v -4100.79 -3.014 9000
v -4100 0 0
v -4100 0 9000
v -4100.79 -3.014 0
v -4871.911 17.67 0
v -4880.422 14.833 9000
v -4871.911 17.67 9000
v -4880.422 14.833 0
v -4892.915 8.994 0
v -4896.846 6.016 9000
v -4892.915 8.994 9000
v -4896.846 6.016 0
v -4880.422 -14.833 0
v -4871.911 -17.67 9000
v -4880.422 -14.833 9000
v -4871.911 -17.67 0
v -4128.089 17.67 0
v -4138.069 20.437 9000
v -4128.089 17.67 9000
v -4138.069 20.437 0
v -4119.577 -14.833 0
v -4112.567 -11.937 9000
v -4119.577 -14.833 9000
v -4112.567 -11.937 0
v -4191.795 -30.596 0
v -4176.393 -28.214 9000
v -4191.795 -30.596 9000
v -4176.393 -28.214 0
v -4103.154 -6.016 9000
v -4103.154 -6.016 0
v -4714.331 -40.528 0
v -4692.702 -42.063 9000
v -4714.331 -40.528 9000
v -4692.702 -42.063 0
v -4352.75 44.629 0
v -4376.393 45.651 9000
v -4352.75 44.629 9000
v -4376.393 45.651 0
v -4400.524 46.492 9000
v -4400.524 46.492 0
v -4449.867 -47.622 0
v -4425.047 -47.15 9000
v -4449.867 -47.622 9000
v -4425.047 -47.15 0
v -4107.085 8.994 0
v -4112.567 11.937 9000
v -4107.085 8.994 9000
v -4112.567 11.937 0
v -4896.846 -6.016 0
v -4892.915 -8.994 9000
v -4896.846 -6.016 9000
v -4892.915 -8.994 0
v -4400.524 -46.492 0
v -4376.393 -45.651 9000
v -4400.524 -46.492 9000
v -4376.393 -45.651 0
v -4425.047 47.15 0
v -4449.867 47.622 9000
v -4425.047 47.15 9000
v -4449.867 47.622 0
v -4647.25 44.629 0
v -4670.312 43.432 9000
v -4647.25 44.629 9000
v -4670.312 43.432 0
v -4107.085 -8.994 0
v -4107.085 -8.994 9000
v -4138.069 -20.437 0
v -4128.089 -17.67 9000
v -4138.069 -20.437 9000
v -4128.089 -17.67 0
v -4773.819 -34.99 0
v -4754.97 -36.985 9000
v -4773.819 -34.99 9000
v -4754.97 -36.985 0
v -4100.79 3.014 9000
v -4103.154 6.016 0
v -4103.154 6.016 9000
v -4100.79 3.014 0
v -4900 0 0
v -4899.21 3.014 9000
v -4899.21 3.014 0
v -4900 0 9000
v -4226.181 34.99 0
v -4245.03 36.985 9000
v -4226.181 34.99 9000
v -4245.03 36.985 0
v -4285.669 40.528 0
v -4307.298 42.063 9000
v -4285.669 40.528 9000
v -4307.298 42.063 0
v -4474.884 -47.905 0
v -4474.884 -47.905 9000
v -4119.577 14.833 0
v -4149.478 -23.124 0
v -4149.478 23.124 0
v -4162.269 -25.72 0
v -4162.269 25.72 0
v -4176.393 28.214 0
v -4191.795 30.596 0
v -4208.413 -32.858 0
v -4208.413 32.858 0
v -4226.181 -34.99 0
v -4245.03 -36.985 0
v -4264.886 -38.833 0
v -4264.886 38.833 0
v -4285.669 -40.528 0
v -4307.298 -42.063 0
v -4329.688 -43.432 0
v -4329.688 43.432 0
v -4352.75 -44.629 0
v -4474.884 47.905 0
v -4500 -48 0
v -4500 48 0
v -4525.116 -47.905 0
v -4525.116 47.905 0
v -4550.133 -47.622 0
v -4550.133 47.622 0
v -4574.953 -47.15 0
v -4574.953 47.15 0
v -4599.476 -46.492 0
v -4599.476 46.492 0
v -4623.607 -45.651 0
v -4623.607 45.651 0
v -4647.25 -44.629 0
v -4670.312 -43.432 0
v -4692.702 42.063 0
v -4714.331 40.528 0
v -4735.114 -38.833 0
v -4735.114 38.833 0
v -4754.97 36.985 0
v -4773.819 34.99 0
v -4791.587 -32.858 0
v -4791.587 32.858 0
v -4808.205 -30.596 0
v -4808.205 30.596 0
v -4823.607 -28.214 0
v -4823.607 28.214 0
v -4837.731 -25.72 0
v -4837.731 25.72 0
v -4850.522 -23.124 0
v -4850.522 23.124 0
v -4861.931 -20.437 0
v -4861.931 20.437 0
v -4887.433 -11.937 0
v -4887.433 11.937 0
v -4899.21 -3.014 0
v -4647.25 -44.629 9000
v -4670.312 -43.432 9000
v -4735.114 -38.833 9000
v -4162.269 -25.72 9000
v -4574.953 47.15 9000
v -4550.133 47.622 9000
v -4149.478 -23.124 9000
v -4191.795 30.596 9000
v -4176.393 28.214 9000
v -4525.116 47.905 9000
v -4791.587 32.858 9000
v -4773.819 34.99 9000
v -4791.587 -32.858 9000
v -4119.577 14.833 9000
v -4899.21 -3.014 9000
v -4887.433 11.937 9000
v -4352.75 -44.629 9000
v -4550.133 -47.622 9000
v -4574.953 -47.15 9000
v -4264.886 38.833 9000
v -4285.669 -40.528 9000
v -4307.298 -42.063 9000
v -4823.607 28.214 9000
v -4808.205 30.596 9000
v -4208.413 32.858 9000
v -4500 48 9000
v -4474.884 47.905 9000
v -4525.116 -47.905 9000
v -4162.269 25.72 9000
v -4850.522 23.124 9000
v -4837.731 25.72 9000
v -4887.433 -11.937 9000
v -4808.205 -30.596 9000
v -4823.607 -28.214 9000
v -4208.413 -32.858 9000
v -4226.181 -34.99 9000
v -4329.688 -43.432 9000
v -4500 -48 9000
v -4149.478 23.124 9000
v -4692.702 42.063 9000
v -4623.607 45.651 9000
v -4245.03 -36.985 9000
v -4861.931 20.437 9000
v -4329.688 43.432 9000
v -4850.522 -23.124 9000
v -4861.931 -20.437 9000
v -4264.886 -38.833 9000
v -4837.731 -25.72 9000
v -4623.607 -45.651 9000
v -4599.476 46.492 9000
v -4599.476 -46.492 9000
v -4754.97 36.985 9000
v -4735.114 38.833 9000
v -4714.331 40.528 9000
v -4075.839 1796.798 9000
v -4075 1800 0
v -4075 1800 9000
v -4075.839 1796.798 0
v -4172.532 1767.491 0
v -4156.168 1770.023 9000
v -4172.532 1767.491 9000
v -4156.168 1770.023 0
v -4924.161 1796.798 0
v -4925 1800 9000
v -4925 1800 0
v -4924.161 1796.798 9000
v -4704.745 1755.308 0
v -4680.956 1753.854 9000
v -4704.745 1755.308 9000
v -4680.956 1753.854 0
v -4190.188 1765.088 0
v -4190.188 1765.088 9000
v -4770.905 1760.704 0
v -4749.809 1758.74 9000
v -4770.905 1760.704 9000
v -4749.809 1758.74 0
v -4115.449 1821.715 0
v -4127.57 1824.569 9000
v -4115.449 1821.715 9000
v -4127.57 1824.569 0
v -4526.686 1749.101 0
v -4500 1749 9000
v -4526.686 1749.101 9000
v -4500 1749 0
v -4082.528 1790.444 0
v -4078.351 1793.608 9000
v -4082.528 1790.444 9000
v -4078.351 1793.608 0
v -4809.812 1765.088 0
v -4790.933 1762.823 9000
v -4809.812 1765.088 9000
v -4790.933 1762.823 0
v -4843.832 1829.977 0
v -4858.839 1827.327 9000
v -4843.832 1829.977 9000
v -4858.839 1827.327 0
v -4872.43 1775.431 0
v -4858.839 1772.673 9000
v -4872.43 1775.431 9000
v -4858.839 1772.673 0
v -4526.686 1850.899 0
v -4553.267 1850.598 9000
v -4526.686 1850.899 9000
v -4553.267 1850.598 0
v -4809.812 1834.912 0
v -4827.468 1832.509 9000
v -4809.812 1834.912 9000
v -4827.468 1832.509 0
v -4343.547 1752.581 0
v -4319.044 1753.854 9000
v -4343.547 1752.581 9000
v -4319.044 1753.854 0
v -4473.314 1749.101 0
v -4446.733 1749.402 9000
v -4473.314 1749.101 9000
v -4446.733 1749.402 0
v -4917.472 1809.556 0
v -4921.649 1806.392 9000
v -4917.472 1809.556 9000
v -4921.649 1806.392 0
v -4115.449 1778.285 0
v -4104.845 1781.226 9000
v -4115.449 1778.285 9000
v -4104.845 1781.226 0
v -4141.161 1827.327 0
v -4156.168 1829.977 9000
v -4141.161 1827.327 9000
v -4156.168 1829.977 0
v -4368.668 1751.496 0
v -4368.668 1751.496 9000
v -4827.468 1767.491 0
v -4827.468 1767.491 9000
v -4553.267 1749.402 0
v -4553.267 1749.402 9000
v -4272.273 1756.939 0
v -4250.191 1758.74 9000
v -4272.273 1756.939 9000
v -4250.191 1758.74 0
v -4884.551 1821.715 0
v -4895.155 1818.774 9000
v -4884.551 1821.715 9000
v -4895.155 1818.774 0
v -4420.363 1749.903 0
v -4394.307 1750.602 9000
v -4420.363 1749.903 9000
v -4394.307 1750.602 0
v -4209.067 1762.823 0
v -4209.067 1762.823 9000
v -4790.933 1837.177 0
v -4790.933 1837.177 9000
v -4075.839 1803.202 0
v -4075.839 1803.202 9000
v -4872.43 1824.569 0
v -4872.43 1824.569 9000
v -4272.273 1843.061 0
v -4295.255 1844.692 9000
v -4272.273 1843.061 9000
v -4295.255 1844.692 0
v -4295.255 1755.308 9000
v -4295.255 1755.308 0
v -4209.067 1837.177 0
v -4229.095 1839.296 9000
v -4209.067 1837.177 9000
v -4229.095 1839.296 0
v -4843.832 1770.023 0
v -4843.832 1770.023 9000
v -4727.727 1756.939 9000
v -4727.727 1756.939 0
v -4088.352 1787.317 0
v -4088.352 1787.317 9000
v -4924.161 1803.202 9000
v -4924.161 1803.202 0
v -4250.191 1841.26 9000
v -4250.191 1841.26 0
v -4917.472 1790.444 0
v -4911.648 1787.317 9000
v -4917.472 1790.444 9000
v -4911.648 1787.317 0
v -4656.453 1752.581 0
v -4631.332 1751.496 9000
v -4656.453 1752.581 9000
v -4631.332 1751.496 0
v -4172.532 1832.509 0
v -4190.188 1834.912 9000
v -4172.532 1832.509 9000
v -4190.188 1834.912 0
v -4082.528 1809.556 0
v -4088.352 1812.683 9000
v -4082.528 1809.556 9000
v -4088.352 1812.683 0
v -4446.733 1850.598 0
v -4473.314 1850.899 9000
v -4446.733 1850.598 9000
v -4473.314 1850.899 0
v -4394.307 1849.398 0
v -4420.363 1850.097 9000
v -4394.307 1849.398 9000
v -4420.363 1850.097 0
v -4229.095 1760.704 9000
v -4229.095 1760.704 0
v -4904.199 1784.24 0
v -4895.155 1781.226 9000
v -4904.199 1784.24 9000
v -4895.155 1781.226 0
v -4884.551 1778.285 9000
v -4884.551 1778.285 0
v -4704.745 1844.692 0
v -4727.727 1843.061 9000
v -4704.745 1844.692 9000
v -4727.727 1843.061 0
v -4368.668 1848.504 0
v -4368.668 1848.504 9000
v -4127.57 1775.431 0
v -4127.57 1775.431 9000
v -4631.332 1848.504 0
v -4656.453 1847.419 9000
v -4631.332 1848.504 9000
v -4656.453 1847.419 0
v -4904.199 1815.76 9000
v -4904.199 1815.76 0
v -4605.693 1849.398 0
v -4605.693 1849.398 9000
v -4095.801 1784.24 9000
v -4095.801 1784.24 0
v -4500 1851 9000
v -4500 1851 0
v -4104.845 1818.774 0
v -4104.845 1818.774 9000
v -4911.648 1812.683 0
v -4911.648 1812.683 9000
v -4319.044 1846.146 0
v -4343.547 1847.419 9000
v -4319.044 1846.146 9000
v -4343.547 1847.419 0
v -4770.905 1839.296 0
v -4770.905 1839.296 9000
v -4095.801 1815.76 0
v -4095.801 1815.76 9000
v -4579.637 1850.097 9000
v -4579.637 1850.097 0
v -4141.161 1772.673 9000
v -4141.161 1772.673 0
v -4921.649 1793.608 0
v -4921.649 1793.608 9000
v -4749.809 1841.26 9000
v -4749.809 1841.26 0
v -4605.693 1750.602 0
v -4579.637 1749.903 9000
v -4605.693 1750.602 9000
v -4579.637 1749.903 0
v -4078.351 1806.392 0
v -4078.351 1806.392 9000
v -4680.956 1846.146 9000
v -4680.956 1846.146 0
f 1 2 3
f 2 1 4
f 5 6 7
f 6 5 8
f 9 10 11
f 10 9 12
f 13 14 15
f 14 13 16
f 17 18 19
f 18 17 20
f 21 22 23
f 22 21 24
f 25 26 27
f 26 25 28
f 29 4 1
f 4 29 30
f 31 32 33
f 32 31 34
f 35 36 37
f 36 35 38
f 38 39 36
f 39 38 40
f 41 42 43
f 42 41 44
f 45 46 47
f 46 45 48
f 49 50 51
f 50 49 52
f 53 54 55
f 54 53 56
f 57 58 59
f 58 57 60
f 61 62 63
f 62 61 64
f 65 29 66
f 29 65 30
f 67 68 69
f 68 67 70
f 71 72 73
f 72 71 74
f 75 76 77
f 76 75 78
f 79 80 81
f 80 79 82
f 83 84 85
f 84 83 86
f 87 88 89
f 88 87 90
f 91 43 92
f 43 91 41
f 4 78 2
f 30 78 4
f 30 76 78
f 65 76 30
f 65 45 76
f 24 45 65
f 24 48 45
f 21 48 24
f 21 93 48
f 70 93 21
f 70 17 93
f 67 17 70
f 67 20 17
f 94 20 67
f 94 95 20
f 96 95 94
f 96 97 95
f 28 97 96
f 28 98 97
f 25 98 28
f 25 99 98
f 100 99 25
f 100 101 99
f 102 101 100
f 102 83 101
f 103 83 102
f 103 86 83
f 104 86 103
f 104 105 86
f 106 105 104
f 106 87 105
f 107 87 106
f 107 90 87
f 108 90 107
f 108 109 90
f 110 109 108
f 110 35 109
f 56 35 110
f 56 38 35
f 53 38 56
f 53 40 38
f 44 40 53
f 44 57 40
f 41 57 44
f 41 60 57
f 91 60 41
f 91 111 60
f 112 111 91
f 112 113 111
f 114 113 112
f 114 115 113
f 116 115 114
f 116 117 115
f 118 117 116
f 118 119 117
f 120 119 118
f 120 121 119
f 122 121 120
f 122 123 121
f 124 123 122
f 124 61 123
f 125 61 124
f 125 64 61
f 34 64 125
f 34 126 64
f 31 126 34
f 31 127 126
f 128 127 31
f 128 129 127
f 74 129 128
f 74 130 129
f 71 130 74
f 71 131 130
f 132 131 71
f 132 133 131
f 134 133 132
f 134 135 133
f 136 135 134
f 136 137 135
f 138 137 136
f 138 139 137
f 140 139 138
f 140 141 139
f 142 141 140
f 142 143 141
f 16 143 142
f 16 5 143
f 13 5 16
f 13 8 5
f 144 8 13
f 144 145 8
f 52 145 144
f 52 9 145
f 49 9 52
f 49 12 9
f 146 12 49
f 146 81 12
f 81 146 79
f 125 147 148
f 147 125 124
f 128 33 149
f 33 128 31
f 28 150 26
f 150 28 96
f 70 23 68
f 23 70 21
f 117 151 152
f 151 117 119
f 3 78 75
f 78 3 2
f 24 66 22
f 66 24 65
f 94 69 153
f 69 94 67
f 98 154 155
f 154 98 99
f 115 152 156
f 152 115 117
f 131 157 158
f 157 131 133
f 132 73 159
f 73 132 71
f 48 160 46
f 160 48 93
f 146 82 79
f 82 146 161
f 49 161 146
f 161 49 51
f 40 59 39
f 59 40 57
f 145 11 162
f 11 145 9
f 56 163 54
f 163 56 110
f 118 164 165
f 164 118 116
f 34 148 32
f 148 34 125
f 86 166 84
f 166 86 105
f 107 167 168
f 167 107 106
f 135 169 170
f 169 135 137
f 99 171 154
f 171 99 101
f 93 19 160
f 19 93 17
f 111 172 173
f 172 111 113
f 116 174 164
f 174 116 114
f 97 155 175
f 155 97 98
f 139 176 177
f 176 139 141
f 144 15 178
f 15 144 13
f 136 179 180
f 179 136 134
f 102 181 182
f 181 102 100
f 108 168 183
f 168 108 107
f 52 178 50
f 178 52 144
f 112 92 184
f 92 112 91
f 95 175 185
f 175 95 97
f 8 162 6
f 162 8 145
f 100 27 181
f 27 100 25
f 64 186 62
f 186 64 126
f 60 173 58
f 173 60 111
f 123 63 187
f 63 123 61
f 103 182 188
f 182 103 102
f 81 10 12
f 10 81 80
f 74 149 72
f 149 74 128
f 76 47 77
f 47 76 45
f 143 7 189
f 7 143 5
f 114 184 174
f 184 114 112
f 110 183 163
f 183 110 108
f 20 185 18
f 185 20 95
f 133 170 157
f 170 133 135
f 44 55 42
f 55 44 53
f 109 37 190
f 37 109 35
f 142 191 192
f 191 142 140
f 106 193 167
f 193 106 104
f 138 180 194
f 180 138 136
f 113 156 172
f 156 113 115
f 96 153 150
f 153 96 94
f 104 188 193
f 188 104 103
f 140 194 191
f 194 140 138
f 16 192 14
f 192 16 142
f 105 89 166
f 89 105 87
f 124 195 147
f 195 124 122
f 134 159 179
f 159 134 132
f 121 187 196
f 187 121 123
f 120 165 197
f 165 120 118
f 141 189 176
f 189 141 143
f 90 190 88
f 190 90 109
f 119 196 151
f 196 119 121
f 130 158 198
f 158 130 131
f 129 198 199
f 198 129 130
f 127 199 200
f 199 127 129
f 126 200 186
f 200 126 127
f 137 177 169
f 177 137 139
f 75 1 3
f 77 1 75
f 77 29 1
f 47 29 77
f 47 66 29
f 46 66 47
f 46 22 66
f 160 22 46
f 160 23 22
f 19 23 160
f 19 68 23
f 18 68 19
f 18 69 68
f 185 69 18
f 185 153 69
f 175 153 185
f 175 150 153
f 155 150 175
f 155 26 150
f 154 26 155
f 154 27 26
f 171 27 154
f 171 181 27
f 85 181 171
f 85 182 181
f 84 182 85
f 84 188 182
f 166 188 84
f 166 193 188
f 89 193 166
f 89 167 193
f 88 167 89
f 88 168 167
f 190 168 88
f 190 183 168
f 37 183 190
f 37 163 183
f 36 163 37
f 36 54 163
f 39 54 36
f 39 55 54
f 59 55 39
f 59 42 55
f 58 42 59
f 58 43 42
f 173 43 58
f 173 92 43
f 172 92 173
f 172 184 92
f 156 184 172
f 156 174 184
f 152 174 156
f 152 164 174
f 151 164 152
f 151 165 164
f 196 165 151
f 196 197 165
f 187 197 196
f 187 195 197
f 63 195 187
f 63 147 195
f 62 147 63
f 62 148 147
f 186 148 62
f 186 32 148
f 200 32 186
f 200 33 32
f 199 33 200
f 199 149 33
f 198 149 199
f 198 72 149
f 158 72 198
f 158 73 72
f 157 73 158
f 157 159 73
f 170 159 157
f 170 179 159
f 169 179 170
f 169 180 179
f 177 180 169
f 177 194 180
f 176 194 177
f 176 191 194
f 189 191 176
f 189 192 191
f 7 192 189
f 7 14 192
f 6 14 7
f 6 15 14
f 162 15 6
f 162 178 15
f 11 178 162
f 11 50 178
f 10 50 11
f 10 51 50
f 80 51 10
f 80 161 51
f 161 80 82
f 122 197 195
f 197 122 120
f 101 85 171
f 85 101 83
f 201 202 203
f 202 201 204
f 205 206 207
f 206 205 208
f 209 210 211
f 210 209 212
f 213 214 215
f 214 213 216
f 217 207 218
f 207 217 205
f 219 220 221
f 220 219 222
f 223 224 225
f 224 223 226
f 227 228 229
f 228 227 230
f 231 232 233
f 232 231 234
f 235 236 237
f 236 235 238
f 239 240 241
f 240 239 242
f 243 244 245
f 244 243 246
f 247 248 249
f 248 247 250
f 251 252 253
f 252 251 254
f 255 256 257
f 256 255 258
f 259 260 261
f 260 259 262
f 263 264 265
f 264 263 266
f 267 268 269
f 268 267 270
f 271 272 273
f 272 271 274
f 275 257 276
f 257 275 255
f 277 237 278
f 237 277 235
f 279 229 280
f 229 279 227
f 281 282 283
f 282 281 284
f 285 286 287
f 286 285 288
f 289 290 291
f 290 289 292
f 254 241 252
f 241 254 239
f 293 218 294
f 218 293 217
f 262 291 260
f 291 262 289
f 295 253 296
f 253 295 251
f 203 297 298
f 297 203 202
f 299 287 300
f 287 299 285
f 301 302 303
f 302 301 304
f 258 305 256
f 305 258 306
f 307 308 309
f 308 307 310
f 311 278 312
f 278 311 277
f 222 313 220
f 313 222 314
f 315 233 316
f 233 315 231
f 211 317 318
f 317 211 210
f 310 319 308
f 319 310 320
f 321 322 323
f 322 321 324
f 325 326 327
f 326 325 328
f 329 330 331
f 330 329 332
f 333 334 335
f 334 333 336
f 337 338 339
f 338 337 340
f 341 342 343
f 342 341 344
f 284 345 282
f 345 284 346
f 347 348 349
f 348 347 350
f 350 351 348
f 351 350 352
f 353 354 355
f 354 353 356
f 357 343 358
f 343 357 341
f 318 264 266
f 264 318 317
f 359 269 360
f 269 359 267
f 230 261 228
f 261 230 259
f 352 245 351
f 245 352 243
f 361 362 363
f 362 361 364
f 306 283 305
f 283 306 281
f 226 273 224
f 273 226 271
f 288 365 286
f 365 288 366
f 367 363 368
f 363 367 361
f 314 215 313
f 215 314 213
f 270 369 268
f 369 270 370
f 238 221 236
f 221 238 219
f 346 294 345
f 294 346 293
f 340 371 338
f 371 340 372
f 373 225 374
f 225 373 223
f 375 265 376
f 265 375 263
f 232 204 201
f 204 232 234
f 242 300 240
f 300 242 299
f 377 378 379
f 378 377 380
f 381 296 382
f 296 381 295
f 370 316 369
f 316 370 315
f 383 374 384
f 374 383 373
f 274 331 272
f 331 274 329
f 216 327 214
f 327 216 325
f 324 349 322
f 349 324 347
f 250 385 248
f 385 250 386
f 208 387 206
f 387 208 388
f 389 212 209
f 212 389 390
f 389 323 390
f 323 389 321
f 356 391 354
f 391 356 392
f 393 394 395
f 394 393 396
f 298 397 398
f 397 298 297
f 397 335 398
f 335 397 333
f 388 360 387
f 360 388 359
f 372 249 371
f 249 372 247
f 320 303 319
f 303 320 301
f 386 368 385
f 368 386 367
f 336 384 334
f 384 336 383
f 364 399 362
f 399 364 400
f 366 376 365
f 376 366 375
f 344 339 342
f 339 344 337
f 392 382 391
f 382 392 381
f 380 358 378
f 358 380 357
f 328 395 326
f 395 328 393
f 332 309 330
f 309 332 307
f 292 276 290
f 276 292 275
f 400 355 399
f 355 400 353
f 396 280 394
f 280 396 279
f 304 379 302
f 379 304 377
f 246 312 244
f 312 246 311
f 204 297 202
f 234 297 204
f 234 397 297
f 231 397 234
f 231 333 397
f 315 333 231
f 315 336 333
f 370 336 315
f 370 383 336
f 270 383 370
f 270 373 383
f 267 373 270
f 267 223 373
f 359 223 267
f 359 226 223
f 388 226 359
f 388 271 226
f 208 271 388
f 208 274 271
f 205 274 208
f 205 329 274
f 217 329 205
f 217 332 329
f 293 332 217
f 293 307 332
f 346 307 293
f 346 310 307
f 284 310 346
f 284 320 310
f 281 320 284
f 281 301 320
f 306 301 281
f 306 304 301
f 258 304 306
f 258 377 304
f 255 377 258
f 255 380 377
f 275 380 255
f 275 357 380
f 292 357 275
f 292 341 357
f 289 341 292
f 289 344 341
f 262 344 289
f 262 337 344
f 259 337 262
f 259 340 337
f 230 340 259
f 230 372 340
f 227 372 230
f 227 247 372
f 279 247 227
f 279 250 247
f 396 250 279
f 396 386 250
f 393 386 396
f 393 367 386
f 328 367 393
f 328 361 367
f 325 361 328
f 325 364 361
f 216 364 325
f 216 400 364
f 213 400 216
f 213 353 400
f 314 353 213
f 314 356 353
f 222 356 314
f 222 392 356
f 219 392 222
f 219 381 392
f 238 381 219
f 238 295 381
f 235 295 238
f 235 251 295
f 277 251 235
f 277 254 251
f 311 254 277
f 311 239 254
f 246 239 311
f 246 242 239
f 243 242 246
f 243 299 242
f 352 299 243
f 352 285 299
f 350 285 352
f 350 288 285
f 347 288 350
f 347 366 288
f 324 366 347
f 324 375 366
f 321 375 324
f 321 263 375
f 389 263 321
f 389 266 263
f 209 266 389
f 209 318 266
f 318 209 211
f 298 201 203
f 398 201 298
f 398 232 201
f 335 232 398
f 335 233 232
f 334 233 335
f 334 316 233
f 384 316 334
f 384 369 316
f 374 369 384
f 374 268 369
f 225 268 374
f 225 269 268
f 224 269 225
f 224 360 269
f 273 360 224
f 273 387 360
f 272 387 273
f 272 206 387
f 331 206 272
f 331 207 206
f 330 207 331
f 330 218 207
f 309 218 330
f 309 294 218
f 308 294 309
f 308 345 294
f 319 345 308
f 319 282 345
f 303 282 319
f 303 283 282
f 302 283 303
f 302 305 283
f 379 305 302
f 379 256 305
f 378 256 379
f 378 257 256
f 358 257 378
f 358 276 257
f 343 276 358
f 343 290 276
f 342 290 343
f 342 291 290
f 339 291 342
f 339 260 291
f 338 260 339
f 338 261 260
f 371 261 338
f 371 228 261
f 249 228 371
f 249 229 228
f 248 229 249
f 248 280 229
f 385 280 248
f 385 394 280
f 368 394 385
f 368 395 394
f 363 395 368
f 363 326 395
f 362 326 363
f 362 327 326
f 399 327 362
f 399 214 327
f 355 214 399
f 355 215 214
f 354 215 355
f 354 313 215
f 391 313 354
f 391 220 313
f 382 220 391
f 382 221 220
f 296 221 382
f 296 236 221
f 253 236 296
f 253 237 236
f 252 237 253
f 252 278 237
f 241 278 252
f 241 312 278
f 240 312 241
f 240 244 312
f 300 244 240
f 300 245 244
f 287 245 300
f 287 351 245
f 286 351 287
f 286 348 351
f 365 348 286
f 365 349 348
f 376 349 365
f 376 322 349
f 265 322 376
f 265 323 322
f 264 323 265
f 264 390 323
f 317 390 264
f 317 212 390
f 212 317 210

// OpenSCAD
// FireFiterDrone500 - Ön Kanat Profili (NACA 6412)
// OpenSCAD Parametrik Model
// Üretici: FFD500_CAD_Architect

$fn = 100; // Çözünürlük

// --- PARAMETRELER ---
wing_span = 9000; // mm (Toplam açıklık)
chord_front = 800; // mm (Ön kanat kirişi)
chord_rear = 850; // mm (Arka kanat kirişi)
gap = 1800; // mm (Kanatlar arası mesafe)
thickness_ratio = 0.12; // NACA 6412 kalınlık oranı

// --- NACA 6412 PROFİL FONKSİYONU (Basitleştirilmiş) ---
module naca_profile(chord, thickness) {
    max_thickness = chord * thickness;
    // Gerçek NACA koordinatları buraya dizi olarak eklenebilir
    // Şimdilik basit bir airfoil şekli çiziyoruz
    scale([chord, max_thickness, 1]) {
        circle(d=1); // Temsili profil
    }
}

// --- ÖN KANAT ---
module front_wing() {
    translate([-wing_span/2, 0, 0]) {
        linear_extrude(height = wing_span) {
            // Profil çizimi (2D)
            naca_profile(chord_front, thickness_ratio);
        }
    }
}

// --- ARKA KANAT ---
module rear_wing() {
    translate([-wing_span/2, gap, 0]) {
        linear_extrude(height = wing_span) {
            naca_profile(chord_rear, thickness_ratio);
        }
    }
}

// --- MONTAJ ---
color("blue") front_wing();
color("green") rear_wing();

// Not: Gövde ve motor mountları ayrı modüllerde tanımlanacaktır.
echo("FFD500 Wing Profile Generated");
